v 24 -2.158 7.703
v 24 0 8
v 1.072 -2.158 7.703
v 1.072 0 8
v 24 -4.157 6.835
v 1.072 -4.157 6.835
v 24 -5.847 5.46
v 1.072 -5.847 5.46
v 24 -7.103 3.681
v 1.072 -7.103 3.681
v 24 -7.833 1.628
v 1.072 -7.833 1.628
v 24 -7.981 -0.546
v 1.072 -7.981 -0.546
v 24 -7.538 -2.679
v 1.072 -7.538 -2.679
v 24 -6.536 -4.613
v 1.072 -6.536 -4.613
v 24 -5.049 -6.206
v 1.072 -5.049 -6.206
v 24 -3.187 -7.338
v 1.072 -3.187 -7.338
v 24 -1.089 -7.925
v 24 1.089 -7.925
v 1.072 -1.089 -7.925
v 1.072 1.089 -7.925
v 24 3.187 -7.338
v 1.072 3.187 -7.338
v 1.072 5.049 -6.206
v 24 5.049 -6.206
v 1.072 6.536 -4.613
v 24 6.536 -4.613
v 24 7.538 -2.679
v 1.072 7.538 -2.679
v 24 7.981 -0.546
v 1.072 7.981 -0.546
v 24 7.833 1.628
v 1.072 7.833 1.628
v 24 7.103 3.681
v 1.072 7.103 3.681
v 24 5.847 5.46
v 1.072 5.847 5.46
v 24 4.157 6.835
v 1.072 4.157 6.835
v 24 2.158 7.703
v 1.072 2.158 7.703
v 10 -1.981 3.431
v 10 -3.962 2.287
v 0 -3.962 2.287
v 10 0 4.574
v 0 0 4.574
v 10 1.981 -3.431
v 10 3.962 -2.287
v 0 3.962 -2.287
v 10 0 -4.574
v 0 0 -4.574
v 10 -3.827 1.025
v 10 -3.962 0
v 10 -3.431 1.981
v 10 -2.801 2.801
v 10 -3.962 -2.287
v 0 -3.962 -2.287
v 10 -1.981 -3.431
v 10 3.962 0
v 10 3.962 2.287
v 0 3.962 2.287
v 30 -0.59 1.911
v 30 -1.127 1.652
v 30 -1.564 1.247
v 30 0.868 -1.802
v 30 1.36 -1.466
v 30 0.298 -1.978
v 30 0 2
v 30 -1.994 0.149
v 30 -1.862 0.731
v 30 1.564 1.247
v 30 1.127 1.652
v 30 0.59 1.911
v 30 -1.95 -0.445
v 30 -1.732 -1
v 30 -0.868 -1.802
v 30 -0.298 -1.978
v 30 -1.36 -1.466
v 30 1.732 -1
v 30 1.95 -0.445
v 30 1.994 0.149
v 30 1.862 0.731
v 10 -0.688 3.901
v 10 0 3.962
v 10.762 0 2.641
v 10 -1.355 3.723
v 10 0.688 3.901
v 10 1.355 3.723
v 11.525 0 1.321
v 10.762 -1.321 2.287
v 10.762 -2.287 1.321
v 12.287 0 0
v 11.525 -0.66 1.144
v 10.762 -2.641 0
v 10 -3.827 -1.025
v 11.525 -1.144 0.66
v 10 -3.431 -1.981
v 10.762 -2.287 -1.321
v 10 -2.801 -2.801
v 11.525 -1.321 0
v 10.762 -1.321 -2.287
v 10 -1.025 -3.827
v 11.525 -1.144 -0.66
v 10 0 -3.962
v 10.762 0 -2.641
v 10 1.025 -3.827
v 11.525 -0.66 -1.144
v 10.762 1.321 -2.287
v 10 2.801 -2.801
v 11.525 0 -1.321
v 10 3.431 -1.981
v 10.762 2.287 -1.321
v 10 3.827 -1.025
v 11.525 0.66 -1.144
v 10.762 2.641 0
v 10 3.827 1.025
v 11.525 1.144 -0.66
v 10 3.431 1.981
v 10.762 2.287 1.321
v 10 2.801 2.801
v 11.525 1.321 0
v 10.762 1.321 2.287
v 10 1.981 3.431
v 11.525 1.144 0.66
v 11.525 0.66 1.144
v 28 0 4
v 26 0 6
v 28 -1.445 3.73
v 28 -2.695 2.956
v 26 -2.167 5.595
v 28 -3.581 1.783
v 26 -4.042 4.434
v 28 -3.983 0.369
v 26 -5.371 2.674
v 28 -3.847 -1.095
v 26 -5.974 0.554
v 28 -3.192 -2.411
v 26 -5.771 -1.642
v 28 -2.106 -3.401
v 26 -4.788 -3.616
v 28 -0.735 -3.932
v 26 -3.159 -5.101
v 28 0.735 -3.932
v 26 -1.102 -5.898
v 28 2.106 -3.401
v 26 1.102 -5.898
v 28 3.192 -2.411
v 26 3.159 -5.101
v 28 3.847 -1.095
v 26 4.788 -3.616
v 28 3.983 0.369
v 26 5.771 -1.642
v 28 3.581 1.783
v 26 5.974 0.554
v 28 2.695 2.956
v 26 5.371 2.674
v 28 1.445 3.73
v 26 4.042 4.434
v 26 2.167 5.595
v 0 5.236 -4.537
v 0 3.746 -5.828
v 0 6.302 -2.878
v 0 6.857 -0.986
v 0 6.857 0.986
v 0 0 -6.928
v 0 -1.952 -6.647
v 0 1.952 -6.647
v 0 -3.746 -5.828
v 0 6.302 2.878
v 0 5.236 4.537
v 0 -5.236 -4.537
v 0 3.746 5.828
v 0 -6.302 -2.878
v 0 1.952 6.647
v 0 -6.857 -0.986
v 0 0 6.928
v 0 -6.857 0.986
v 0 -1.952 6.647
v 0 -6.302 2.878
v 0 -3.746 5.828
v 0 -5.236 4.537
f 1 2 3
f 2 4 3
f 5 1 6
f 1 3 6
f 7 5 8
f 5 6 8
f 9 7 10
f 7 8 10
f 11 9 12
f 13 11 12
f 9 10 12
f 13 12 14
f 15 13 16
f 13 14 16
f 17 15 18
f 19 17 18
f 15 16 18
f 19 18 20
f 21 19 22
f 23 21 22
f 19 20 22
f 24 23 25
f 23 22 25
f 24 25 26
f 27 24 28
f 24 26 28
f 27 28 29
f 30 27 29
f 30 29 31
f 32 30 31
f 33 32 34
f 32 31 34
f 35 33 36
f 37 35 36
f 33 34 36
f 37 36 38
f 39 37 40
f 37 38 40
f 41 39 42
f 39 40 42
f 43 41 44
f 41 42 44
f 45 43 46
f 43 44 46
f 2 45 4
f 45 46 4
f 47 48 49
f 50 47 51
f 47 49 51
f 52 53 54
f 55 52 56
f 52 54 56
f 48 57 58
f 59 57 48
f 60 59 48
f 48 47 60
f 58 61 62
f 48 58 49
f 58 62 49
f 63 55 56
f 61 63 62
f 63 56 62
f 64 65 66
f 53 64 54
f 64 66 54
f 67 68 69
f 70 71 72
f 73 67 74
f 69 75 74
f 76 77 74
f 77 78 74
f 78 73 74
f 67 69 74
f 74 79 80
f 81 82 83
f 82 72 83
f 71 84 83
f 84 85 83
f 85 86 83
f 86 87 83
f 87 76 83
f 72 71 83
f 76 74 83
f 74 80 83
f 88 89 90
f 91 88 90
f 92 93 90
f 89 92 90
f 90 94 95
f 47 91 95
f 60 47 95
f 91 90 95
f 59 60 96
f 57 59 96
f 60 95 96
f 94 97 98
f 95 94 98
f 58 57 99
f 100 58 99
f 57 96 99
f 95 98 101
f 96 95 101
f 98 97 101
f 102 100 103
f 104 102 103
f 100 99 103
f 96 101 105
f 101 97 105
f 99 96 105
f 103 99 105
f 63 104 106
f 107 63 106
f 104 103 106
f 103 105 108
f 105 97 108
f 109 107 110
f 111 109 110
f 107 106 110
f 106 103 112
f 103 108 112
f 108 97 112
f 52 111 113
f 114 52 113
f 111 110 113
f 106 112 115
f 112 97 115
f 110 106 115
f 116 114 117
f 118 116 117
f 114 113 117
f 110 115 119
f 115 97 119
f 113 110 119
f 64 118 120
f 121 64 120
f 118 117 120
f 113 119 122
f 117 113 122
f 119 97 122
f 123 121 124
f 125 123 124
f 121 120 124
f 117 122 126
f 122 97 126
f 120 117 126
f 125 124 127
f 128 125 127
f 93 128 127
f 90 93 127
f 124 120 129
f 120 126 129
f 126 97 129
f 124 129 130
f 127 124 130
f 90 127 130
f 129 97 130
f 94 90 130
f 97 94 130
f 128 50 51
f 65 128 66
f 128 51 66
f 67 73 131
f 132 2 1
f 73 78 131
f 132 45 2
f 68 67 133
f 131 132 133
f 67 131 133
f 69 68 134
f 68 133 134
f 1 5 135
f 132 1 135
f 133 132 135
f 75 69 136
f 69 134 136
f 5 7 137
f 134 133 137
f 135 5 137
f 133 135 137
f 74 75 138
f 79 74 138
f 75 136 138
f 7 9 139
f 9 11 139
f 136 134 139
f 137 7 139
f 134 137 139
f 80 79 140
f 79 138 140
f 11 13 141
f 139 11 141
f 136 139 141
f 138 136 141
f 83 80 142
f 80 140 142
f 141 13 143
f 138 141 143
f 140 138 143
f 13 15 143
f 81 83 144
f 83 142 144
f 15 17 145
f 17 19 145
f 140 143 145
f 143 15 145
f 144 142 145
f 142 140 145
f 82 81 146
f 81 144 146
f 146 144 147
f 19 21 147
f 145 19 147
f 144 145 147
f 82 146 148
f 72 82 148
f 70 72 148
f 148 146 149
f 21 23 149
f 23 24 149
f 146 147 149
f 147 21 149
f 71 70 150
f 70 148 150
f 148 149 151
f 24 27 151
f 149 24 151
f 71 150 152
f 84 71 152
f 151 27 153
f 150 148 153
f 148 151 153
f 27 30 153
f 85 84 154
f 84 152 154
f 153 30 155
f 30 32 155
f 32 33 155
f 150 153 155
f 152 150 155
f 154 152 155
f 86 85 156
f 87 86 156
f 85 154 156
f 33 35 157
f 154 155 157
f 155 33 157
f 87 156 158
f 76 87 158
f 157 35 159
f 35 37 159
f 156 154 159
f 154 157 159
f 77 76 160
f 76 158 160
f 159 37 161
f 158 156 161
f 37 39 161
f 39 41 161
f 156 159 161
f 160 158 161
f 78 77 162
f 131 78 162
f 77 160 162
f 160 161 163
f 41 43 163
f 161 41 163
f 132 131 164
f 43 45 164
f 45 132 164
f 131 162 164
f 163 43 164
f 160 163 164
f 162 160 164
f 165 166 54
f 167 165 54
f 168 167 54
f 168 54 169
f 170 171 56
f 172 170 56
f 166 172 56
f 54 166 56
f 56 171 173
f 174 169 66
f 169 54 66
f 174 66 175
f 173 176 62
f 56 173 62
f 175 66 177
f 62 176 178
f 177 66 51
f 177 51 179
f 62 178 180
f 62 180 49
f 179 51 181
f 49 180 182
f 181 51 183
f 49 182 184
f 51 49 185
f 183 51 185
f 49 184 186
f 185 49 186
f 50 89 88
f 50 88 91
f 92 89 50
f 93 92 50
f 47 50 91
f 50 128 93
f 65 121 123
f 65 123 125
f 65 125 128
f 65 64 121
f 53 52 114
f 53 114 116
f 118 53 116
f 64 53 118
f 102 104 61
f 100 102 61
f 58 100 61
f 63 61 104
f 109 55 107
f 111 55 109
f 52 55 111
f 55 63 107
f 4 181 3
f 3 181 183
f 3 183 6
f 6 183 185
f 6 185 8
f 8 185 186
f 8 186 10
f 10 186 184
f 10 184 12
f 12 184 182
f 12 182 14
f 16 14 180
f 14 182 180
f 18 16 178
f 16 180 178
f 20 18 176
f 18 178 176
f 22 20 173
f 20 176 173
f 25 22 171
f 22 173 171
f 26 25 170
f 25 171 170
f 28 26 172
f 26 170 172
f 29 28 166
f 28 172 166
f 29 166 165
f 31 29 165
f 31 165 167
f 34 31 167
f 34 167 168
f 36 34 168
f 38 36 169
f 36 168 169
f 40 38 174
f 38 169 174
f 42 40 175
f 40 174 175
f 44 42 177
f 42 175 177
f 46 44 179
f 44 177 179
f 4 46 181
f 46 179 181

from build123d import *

# Parameters (mm, degrees)
CUT_EXTRUDE_1_DEPTH = 10


with BuildPart() as part:
    # 草图1 → Revolve 543 (revolve)
    with BuildSketch(Plane.XY, mode=Mode.PRIVATE) as revolve_543_sk:
        Polygon((0, 0), (30, 0), (30, 2), (24, 8), (1.072, 8), (0, 6.928), align=None)
    revolve(revolve_543_sk.sketch.rotate(Axis((-1.4104518, 0, 0), (1, 0, 0)), 90), axis=Axis((-1.4104518, 0, 0), (1, 0, 0)))

    # 草图2 → 切除-拉伸1 (cut)
    with BuildSketch(Plane.ZY):
        Polygon((4.5745, 0), (2.28725, 3.96163321), (-2.28725, 3.96163321), (-4.5745, 0), (-2.28725, -3.96163321), (2.28725, -3.96163321), align=None)
    extrude(amount=-CUT_EXTRUDE_1_DEPTH, mode=Mode.SUBTRACT)

    # 草图3 → 切除-旋转1 (revolve, cut)
    with BuildSketch(Plane.XY, mode=Mode.PRIVATE) as cut_revolve_1_sk:
        Polygon((10, 3.96163321), (12.28725, 0), (10, 0), align=None)
    revolve(cut_revolve_1_sk.sketch.rotate(Axis((-0.121283255, 0, 0), (1, 0, 0)), 90), axis=Axis((-0.121283255, 0, 0), (1, 0, 0)), mode=Mode.SUBTRACT)


solid = part.part
